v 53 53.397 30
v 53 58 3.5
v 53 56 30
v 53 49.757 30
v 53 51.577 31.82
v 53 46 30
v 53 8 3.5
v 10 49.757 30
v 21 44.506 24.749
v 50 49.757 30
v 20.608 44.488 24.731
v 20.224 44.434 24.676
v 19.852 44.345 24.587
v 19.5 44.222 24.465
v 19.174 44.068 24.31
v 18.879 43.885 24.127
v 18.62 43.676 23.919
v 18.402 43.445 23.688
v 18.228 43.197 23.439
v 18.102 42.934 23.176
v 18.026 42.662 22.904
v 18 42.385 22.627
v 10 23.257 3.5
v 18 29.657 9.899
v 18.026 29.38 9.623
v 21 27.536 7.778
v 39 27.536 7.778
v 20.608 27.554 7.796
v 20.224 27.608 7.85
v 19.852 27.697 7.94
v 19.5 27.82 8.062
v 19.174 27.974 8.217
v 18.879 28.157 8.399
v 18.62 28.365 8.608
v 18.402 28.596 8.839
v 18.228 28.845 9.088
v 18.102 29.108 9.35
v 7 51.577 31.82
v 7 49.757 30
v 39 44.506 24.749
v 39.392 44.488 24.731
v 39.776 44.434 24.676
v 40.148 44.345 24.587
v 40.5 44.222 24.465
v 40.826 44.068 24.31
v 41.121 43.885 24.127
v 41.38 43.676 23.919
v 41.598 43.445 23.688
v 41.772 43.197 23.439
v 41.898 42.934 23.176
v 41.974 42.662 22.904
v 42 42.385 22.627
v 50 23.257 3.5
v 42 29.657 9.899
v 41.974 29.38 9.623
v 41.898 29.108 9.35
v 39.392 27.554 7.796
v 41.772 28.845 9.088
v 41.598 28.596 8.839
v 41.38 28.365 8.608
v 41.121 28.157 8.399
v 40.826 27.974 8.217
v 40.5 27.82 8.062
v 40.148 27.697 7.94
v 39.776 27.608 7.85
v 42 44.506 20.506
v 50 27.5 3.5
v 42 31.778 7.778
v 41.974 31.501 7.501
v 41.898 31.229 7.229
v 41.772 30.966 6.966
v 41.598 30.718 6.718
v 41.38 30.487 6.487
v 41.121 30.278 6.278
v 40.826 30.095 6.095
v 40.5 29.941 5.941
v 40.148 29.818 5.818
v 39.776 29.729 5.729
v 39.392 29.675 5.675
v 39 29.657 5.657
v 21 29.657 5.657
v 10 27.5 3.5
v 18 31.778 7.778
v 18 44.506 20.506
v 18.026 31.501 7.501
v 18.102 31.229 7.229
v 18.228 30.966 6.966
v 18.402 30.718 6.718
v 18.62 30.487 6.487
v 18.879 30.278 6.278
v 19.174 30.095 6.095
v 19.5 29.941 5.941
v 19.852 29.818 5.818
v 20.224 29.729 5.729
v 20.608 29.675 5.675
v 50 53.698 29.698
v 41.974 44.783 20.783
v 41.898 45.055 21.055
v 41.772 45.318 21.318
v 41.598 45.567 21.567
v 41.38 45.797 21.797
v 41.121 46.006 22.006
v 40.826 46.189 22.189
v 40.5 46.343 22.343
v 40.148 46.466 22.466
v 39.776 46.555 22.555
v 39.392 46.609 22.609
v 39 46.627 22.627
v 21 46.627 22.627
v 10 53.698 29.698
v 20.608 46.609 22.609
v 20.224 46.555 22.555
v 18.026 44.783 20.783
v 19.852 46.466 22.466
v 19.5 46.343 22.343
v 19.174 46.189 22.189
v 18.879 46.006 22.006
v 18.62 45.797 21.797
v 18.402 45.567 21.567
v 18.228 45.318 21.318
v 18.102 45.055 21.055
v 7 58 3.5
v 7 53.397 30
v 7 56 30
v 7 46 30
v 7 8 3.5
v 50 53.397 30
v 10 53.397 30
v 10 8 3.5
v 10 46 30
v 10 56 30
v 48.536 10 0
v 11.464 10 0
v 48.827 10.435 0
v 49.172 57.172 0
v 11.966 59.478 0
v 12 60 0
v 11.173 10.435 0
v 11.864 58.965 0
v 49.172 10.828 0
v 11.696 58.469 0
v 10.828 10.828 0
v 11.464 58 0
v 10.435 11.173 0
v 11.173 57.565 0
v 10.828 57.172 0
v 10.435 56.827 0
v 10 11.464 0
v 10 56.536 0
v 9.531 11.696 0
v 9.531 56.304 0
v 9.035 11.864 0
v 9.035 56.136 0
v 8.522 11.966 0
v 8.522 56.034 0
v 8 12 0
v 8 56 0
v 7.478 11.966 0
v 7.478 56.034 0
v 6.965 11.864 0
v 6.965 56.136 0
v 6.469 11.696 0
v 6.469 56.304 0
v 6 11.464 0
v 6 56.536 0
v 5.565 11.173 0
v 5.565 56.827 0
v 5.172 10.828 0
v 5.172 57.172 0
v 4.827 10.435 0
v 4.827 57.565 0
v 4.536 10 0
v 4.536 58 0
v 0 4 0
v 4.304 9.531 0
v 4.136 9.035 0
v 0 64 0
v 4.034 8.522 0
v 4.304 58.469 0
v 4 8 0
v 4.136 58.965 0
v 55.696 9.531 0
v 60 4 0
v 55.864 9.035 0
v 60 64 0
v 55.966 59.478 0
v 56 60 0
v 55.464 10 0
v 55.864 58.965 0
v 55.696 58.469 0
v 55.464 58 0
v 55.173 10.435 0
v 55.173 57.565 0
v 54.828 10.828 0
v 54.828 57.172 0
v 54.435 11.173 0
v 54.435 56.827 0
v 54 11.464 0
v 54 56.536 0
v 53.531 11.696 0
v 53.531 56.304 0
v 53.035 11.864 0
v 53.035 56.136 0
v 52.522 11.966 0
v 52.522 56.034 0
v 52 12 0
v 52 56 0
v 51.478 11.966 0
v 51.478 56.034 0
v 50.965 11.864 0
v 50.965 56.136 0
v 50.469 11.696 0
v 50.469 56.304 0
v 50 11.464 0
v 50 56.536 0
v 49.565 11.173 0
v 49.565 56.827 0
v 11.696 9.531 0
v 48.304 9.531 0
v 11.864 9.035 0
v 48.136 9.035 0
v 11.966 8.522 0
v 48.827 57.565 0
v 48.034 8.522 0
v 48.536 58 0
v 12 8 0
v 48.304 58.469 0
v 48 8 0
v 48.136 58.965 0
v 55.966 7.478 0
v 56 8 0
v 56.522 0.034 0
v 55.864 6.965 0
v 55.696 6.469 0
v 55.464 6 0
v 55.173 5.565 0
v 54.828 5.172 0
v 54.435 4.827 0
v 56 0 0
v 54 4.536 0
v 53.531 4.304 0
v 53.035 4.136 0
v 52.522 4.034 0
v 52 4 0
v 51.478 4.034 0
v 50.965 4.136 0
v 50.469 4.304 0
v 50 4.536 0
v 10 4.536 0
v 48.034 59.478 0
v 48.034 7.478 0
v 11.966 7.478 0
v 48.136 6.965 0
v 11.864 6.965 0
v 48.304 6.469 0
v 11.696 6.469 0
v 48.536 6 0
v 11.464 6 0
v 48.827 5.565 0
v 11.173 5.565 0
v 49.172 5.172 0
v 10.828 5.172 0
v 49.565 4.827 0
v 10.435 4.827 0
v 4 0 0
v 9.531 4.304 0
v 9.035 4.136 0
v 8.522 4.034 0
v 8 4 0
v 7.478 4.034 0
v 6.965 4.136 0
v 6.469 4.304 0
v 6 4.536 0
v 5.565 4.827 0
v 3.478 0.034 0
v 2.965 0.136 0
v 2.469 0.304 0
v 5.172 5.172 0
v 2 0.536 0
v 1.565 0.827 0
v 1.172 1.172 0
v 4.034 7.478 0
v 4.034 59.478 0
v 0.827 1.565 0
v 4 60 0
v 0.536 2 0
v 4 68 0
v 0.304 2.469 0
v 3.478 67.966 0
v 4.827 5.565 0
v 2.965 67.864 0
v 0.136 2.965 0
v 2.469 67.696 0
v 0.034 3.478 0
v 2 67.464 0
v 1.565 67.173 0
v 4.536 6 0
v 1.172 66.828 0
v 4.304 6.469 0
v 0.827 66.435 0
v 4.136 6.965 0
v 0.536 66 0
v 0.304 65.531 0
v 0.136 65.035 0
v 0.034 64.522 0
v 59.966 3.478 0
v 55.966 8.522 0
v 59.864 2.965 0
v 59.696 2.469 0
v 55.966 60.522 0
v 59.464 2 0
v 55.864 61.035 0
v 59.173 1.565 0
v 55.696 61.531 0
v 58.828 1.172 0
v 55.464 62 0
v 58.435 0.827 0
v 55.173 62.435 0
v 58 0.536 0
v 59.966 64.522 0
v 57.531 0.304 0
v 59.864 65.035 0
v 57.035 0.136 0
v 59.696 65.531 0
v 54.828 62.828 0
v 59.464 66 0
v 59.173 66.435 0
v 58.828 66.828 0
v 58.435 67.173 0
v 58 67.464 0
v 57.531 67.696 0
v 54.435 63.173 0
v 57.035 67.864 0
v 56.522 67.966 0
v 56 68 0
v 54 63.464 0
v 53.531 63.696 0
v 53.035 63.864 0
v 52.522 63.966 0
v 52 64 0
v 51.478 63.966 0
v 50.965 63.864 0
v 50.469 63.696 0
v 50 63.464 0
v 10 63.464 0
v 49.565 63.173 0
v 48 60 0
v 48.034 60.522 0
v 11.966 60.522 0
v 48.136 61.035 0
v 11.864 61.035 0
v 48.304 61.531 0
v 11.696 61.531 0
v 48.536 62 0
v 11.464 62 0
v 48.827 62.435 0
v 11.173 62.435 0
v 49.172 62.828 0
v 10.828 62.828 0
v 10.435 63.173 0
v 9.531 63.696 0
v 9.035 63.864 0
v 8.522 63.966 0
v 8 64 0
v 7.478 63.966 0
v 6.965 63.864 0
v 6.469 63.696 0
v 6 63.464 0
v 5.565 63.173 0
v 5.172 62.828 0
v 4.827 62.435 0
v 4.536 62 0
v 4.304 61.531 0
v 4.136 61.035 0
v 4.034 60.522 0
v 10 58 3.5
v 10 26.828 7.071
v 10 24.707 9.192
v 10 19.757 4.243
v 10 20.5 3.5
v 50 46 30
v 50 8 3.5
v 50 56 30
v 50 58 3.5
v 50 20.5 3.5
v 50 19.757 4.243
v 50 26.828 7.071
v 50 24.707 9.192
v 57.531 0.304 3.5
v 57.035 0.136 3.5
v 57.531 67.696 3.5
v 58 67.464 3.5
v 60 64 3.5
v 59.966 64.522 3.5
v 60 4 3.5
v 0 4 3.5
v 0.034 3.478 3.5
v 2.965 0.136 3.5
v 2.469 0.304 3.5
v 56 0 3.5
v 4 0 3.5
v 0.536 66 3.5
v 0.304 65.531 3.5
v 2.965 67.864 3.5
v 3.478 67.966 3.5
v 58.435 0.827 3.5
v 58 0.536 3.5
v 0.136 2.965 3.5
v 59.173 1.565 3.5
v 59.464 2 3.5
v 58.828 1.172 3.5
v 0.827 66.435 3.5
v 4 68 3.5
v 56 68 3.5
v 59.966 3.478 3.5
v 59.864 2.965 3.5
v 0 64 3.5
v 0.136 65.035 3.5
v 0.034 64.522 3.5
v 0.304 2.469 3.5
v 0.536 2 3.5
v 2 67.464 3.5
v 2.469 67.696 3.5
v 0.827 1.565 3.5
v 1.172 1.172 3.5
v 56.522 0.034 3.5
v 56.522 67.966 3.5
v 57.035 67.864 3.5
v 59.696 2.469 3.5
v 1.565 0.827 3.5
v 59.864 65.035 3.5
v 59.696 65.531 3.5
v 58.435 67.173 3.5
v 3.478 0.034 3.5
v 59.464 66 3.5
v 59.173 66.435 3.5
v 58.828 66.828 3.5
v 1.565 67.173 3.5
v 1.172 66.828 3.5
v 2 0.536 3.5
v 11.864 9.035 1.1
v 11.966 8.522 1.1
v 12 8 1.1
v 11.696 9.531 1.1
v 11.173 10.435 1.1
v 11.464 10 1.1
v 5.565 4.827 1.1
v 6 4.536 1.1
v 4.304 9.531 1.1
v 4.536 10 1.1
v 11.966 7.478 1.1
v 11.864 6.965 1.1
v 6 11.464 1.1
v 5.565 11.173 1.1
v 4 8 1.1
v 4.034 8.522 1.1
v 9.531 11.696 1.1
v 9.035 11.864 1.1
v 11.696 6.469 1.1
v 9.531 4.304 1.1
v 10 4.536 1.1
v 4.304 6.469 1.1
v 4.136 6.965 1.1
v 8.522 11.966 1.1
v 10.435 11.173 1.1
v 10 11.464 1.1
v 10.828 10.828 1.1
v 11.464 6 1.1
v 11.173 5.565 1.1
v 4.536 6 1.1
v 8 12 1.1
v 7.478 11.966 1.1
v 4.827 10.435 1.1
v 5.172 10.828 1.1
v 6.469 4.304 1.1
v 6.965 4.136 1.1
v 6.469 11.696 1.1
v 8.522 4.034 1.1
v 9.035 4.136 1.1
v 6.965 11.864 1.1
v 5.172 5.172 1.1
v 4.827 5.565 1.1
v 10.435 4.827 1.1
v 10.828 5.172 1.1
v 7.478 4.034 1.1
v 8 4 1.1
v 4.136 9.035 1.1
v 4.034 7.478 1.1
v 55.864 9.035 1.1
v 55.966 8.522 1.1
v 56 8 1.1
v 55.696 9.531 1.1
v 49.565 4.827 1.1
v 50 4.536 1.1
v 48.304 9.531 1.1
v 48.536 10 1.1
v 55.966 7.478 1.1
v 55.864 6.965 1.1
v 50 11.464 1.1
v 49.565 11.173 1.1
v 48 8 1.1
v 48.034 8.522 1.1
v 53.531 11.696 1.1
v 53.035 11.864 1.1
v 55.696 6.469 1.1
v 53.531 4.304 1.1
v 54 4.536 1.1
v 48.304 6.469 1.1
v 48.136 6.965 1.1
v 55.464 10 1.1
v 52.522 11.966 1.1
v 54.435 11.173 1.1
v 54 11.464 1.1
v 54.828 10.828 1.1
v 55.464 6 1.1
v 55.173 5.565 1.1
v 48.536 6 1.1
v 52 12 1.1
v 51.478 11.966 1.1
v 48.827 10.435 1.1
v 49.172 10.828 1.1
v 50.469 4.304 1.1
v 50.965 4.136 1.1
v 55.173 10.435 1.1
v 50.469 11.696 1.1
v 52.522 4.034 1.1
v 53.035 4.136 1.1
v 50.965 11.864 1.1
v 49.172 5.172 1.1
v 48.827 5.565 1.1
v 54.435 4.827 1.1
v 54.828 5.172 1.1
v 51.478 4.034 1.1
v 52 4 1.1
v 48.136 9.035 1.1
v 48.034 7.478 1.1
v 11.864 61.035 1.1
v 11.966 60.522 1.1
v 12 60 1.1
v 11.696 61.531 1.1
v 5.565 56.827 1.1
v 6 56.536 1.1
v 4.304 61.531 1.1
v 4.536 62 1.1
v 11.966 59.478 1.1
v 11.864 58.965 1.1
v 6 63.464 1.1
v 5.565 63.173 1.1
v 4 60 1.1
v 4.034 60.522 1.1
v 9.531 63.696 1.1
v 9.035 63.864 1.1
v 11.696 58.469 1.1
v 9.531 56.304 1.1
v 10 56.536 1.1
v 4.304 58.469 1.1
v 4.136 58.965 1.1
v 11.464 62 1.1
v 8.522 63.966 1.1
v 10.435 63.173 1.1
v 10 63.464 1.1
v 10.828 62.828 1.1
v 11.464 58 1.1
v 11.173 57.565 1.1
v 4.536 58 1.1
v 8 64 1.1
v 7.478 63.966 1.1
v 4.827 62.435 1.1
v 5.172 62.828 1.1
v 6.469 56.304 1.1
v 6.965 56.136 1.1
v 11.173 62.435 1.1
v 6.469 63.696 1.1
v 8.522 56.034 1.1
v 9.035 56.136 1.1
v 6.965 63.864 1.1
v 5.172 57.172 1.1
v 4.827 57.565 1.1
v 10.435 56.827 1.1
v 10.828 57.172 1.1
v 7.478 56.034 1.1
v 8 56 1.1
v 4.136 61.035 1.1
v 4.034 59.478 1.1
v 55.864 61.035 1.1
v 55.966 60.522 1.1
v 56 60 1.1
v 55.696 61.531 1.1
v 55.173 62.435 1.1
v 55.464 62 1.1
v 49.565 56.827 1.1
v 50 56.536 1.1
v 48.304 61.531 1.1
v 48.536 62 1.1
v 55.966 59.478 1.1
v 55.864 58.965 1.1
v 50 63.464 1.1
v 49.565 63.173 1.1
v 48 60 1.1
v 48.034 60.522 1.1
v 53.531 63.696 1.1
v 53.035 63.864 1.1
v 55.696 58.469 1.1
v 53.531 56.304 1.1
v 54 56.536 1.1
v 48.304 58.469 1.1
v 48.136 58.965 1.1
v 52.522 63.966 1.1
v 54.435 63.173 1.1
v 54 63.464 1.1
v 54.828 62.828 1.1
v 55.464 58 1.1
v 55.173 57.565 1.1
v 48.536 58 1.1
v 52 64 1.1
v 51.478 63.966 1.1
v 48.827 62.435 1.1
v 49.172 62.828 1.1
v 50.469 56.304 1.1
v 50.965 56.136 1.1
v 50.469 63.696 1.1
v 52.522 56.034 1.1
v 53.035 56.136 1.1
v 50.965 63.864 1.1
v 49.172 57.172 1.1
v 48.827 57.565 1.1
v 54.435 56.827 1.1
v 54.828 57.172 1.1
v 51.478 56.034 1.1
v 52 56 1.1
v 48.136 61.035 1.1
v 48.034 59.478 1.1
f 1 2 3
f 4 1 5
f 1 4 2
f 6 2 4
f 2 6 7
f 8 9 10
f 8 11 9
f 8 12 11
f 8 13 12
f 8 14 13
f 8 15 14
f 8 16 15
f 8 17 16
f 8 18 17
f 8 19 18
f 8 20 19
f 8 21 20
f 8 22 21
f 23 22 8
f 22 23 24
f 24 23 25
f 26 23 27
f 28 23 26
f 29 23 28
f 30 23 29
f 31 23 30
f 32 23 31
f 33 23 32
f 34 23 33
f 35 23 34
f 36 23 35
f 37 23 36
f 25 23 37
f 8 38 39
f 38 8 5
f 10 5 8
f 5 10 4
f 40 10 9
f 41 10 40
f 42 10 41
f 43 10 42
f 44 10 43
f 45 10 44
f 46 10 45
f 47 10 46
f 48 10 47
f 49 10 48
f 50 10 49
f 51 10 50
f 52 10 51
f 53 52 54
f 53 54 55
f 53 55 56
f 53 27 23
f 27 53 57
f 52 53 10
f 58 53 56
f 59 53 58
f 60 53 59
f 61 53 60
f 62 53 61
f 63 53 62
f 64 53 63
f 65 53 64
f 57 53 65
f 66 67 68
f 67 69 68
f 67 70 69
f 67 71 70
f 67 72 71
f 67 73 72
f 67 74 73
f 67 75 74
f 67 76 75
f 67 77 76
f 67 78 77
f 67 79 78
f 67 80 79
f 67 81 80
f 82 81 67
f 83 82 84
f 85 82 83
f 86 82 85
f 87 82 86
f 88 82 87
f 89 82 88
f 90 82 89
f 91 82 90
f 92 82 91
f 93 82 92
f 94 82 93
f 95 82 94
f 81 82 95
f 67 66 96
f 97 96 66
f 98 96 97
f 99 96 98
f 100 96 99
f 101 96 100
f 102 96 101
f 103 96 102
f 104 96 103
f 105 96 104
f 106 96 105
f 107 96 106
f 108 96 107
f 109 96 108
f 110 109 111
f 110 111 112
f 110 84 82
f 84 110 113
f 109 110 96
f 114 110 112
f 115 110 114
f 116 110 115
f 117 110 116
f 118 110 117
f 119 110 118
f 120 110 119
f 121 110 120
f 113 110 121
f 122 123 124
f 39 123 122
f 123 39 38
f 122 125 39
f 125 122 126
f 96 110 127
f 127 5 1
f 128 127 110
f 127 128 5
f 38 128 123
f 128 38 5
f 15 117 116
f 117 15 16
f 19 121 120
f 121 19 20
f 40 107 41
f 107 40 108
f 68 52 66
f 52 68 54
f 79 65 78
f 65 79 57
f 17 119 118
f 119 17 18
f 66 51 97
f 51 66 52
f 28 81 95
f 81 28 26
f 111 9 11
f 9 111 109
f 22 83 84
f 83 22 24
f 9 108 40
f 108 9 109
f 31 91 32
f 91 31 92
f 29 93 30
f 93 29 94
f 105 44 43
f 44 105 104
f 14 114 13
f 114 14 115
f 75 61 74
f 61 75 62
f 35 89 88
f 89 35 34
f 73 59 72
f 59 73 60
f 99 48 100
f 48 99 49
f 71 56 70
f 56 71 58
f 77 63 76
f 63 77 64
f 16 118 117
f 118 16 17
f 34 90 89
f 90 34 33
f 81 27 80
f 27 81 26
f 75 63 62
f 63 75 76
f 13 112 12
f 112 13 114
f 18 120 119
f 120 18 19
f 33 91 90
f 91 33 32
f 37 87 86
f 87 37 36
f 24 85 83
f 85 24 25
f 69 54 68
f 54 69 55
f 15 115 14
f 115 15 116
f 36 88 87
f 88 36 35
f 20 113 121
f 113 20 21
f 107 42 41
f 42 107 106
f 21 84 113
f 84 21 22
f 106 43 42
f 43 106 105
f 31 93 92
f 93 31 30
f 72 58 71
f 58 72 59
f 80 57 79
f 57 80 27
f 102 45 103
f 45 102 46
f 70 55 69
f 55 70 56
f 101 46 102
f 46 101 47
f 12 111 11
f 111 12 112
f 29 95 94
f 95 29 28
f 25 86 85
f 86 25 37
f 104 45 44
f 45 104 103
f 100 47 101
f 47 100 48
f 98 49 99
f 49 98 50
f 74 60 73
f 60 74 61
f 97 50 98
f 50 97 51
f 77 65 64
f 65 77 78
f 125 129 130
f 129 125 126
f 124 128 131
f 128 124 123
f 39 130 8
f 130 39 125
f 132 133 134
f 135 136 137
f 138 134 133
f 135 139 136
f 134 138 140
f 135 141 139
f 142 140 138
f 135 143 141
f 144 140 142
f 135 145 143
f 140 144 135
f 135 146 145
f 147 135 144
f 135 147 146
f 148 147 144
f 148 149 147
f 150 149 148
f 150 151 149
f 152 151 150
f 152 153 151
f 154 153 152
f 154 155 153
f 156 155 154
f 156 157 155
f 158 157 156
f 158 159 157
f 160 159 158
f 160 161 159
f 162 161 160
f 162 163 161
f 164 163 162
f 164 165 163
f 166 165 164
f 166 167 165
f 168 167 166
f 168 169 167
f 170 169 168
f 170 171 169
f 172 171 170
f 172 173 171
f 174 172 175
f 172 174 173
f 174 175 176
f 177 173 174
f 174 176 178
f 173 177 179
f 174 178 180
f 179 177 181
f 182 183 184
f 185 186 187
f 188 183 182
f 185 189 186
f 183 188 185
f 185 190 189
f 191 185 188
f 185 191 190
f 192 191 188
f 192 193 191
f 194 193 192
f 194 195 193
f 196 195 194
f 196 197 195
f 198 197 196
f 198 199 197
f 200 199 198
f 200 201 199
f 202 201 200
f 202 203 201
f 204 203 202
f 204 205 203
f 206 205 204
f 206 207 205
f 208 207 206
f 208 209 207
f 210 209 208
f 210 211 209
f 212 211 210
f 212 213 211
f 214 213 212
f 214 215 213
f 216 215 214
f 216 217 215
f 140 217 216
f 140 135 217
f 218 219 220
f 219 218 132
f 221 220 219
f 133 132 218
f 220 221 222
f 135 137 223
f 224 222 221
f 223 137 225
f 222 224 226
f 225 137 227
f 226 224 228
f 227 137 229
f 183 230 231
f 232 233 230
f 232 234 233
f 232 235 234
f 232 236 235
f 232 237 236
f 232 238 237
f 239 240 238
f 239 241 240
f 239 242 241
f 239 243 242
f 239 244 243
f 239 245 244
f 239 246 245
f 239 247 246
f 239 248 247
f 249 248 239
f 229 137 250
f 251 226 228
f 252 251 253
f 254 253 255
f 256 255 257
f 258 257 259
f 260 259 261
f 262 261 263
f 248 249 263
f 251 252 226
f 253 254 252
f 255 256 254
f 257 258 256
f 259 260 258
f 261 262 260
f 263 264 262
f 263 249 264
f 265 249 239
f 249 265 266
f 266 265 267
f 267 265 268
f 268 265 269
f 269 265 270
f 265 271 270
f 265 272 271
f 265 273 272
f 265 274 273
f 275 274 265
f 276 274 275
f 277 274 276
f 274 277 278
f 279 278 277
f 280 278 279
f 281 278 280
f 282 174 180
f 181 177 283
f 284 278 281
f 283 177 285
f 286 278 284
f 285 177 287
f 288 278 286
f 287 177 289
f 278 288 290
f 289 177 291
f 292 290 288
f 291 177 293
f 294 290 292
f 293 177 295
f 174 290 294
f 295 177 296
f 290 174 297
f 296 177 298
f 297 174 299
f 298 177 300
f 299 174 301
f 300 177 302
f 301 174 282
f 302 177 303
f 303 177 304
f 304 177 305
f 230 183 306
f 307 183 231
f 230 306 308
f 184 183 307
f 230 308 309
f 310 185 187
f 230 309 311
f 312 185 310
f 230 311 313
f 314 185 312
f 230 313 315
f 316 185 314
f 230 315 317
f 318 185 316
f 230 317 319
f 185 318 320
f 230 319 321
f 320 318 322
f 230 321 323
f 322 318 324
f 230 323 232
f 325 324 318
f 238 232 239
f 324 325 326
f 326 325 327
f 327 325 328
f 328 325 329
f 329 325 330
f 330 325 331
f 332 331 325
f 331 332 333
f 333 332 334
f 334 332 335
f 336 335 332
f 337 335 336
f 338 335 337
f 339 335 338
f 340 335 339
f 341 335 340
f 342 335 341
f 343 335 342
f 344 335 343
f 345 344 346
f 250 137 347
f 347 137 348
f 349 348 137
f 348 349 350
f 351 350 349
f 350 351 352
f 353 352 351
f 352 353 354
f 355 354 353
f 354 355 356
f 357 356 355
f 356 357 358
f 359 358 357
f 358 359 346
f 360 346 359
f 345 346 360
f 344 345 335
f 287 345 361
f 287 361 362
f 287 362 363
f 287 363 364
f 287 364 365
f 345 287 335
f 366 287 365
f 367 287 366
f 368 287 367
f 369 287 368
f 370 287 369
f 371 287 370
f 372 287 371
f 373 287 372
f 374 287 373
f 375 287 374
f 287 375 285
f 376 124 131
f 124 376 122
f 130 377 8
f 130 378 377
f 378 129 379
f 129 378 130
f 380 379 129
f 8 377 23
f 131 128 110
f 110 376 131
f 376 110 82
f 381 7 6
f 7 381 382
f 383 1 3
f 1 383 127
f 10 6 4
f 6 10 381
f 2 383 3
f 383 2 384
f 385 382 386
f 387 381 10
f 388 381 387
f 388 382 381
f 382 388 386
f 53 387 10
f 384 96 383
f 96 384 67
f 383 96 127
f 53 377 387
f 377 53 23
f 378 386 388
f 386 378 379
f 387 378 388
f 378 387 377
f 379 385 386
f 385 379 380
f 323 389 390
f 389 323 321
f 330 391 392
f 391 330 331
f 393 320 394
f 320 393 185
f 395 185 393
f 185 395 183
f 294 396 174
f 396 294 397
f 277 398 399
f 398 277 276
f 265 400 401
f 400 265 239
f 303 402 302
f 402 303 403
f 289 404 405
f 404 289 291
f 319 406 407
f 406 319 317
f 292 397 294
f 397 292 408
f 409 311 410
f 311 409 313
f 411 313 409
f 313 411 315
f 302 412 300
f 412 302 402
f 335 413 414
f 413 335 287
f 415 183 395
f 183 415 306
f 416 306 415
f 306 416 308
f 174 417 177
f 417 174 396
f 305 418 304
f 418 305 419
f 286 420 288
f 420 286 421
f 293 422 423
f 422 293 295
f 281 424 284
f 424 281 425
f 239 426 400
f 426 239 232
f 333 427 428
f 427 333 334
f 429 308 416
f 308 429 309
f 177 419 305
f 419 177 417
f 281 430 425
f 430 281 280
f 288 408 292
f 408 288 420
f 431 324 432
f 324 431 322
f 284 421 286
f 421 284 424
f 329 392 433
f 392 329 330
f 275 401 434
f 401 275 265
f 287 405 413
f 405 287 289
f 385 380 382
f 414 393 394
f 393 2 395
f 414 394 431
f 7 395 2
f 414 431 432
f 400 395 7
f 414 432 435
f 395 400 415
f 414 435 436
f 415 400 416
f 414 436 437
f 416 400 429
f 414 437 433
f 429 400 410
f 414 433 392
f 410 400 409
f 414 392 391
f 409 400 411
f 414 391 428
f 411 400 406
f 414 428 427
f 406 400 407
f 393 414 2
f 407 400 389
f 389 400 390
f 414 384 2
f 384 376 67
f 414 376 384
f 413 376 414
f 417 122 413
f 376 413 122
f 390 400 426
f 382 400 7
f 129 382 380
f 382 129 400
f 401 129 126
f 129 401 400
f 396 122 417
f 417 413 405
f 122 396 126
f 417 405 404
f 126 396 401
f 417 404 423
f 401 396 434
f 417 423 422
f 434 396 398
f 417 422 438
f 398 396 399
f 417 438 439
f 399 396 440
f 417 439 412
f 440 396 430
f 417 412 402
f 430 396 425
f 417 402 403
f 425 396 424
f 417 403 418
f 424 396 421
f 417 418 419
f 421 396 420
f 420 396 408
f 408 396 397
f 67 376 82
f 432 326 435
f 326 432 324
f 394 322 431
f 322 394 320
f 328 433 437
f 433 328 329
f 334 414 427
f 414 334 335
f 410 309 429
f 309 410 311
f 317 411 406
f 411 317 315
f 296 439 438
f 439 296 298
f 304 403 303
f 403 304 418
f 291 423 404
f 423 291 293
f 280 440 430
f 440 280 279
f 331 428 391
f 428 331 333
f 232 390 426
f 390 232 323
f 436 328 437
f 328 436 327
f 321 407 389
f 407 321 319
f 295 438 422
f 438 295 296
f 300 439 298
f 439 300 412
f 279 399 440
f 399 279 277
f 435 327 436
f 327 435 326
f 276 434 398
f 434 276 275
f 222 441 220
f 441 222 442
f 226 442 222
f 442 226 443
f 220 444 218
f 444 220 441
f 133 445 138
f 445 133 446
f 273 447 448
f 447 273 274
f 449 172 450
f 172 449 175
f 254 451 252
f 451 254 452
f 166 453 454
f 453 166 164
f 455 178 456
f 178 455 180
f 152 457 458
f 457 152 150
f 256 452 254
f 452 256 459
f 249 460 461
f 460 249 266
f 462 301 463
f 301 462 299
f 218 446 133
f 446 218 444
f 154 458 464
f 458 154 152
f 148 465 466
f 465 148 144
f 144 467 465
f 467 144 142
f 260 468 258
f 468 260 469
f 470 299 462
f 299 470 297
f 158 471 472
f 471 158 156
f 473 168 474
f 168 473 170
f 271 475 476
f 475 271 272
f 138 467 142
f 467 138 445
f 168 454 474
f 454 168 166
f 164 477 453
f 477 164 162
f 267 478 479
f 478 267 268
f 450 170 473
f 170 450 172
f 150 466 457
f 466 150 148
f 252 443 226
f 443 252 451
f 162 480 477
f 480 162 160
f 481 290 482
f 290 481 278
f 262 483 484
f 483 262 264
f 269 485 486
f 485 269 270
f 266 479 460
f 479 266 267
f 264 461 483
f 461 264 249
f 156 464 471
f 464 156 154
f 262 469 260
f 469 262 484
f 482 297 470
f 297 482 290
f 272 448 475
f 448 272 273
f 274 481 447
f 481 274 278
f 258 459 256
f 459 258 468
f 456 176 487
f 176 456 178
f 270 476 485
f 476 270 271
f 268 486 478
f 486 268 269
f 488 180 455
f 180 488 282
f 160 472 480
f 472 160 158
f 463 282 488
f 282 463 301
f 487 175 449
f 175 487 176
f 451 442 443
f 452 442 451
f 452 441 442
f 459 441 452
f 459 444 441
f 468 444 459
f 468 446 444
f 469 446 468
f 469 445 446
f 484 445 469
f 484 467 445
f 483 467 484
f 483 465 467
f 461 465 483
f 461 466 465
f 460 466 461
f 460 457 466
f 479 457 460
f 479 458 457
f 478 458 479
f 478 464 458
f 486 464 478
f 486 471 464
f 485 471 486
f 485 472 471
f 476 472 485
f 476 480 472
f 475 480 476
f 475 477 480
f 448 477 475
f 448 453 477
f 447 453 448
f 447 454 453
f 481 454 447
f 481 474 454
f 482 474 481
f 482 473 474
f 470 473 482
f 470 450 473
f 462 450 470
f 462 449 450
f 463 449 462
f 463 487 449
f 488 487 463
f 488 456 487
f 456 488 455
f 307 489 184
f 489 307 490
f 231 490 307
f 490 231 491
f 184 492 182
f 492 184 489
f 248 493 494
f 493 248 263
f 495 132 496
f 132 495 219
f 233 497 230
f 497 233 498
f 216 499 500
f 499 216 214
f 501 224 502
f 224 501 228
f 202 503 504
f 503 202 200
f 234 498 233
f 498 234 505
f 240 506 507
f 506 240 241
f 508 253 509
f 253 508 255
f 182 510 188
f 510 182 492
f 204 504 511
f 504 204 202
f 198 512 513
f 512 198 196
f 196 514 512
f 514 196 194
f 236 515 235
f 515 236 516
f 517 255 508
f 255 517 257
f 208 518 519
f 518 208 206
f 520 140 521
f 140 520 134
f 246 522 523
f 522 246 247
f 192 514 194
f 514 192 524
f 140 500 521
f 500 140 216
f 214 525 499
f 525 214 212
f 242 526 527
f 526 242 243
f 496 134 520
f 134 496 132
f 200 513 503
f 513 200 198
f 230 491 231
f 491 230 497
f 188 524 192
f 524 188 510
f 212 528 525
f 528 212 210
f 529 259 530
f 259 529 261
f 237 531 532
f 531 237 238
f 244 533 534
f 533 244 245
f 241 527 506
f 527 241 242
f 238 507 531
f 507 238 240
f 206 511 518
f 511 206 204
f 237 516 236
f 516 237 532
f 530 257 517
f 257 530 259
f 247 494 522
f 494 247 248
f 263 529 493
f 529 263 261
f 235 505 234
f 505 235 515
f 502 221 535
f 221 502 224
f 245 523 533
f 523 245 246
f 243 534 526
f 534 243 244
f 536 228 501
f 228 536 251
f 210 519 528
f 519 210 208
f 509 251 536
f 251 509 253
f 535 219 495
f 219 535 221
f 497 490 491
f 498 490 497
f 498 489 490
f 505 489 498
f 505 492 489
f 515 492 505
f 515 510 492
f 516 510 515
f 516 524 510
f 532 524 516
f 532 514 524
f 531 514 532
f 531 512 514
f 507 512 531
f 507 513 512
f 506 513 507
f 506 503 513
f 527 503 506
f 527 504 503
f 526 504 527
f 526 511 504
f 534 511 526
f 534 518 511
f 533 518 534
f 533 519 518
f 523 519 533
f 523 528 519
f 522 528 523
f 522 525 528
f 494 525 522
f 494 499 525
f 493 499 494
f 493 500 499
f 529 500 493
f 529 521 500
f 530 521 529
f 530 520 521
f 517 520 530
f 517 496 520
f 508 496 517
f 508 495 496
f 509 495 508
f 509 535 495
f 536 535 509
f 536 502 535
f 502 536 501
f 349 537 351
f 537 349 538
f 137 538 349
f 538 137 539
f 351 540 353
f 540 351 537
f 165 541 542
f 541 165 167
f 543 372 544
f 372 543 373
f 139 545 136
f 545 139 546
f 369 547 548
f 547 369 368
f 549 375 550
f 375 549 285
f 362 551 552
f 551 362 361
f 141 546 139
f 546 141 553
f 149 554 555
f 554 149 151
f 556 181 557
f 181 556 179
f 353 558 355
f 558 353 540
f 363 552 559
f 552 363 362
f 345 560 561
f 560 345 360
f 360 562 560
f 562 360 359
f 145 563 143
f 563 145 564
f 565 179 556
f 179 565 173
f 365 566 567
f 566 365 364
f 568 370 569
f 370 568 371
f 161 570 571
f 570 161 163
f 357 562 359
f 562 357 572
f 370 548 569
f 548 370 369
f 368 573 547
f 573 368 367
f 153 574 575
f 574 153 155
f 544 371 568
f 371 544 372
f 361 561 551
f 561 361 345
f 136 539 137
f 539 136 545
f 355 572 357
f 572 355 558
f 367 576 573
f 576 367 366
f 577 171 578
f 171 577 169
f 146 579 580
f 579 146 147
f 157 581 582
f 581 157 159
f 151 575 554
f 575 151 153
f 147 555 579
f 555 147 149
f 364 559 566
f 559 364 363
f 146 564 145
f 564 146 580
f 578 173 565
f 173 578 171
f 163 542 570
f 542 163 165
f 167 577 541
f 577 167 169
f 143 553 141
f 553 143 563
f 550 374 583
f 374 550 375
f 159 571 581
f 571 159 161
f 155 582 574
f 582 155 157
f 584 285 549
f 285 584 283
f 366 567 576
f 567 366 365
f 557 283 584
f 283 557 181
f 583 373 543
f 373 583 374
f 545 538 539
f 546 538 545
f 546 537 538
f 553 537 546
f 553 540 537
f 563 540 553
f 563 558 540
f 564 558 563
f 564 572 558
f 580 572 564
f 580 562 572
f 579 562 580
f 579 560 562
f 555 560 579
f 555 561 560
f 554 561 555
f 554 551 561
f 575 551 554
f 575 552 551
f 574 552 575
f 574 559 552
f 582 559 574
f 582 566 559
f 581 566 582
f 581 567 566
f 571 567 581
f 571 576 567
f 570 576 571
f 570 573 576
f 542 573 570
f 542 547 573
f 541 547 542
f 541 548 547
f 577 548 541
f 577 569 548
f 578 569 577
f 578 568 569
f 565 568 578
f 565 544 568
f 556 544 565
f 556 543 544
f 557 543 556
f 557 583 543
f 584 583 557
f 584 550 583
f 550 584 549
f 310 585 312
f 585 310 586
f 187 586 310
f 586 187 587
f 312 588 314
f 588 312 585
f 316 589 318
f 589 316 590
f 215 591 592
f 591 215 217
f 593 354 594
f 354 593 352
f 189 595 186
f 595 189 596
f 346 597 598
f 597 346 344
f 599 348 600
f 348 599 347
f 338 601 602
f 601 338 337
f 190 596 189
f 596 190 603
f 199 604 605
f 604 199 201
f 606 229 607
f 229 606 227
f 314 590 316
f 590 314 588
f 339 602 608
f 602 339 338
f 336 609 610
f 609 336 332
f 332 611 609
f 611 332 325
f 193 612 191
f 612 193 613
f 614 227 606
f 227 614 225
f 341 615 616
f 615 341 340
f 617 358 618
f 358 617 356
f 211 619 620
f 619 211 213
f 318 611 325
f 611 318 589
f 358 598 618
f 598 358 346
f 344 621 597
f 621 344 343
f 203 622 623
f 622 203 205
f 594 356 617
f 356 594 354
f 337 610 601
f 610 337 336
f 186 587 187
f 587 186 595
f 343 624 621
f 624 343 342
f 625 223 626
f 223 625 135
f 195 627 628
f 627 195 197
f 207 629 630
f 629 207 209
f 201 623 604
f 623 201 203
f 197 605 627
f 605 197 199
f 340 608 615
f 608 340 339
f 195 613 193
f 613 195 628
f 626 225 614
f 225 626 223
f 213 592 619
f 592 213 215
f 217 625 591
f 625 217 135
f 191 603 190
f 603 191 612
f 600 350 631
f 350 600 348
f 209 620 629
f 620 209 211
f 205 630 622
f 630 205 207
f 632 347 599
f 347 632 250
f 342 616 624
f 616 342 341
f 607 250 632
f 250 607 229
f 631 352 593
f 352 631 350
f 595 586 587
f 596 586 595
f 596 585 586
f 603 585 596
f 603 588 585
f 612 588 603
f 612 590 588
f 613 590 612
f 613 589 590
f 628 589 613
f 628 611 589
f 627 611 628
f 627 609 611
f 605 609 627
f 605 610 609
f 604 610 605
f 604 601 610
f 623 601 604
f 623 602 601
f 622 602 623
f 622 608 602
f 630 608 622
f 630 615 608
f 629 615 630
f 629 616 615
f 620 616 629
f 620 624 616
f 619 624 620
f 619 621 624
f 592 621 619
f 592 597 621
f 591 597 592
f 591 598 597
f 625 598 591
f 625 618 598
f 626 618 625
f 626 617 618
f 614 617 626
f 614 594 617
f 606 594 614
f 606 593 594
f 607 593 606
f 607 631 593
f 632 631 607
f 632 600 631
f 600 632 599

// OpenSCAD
// =============================================================================
// MultiBand 6 ESP32 Beacon — Attachable Nightstand / Table Stand
// 45-Degree Angled Cradle for Horizontal Desks, Nightstands, and Tables
// =============================================================================

$fn = 48;

// --- Dimensions (mm) ---
cradle_w = 46.0;   // width matching enclosure base
cradle_depth = 42.0; // depth to hold enclosure
tilt_angle = 45.0; // 45-degree angle pointing antenna upward

base_plate_w = 60.0;
base_plate_l = 68.0;
base_plate_h = 3.5;

wall_t = 3.0;
lip_h = 7.0;

module rounded_rect(w, l, h, r) {
    hull() {
        translate([r, r, 0]) cylinder(r=r, h=h);
        translate([w - r, r, 0]) cylinder(r=r, h=h);
        translate([r, l - r, 0]) cylinder(r=r, h=h);
        translate([w - r, l - r, 0]) cylinder(r=r, h=h);
    }
}

module table_stand() {
    difference() {
        union() {
            // Flat Stable Base Foot
            rounded_rect(base_plate_w, base_plate_l, base_plate_h, 4.0);
            
            // Angled Support Wedges
            translate([base_plate_w / 2 - cradle_w / 2, 8.0, 0]) {
                // Left Wedge
                hull() {
                    cube([wall_t, 50.0, base_plate_h]);
                    translate([0, 38.0, 28.0])
                        cube([wall_t, 10.0, 2.0]);
                }
                
                // Right Wedge
                translate([cradle_w - wall_t, 0, 0]) {
                    hull() {
                        cube([wall_t, 50.0, base_plate_h]);
                        translate([0, 38.0, 28.0])
                            cube([wall_t, 10.0, 2.0]);
                    }
                }
                
                // Center Angled Bed Backing
                translate([0, 16.0, 0]) {
                    rotate([tilt_angle, 0, 0]) {
                        difference() {
                            cube([cradle_w, cradle_depth, wall_t]);
                            
                            // Center Weight Reduction Cutout
                            translate([cradle_w / 2 - 12.0, 8.0, -1])
                                rounded_rect(24.0, 24.0, wall_t + 2, 3.0);
                        }
                    }
                }
                
                // Bottom Retention Shelf / Lip (Holds base from sliding down)
                translate([0, 16.0, 0]) {
                    rotate([tilt_angle, 0, 0]) {
                        translate([0, 0, wall_t])
                            cube([cradle_w, lip_h, wall_t]);
                    }
                }
            }
        }
        
        // 4x Anti-Slip Rubber Foot Recesses (8 mm dia, 1 mm deep) on underside
        foot_r = 4.0;
        translate([8.0, 8.0, -0.1]) cylinder(r=foot_r, h=1.2);
        translate([base_plate_w - 8.0, 8.0, -0.1]) cylinder(r=foot_r, h=1.2);
        translate([8.0, base_plate_l - 8.0, -0.1]) cylinder(r=foot_r, h=1.2);
        translate([base_plate_w - 8.0, base_plate_l - 8.0, -0.1]) cylinder(r=foot_r, h=1.2);
    }
}

table_stand();
